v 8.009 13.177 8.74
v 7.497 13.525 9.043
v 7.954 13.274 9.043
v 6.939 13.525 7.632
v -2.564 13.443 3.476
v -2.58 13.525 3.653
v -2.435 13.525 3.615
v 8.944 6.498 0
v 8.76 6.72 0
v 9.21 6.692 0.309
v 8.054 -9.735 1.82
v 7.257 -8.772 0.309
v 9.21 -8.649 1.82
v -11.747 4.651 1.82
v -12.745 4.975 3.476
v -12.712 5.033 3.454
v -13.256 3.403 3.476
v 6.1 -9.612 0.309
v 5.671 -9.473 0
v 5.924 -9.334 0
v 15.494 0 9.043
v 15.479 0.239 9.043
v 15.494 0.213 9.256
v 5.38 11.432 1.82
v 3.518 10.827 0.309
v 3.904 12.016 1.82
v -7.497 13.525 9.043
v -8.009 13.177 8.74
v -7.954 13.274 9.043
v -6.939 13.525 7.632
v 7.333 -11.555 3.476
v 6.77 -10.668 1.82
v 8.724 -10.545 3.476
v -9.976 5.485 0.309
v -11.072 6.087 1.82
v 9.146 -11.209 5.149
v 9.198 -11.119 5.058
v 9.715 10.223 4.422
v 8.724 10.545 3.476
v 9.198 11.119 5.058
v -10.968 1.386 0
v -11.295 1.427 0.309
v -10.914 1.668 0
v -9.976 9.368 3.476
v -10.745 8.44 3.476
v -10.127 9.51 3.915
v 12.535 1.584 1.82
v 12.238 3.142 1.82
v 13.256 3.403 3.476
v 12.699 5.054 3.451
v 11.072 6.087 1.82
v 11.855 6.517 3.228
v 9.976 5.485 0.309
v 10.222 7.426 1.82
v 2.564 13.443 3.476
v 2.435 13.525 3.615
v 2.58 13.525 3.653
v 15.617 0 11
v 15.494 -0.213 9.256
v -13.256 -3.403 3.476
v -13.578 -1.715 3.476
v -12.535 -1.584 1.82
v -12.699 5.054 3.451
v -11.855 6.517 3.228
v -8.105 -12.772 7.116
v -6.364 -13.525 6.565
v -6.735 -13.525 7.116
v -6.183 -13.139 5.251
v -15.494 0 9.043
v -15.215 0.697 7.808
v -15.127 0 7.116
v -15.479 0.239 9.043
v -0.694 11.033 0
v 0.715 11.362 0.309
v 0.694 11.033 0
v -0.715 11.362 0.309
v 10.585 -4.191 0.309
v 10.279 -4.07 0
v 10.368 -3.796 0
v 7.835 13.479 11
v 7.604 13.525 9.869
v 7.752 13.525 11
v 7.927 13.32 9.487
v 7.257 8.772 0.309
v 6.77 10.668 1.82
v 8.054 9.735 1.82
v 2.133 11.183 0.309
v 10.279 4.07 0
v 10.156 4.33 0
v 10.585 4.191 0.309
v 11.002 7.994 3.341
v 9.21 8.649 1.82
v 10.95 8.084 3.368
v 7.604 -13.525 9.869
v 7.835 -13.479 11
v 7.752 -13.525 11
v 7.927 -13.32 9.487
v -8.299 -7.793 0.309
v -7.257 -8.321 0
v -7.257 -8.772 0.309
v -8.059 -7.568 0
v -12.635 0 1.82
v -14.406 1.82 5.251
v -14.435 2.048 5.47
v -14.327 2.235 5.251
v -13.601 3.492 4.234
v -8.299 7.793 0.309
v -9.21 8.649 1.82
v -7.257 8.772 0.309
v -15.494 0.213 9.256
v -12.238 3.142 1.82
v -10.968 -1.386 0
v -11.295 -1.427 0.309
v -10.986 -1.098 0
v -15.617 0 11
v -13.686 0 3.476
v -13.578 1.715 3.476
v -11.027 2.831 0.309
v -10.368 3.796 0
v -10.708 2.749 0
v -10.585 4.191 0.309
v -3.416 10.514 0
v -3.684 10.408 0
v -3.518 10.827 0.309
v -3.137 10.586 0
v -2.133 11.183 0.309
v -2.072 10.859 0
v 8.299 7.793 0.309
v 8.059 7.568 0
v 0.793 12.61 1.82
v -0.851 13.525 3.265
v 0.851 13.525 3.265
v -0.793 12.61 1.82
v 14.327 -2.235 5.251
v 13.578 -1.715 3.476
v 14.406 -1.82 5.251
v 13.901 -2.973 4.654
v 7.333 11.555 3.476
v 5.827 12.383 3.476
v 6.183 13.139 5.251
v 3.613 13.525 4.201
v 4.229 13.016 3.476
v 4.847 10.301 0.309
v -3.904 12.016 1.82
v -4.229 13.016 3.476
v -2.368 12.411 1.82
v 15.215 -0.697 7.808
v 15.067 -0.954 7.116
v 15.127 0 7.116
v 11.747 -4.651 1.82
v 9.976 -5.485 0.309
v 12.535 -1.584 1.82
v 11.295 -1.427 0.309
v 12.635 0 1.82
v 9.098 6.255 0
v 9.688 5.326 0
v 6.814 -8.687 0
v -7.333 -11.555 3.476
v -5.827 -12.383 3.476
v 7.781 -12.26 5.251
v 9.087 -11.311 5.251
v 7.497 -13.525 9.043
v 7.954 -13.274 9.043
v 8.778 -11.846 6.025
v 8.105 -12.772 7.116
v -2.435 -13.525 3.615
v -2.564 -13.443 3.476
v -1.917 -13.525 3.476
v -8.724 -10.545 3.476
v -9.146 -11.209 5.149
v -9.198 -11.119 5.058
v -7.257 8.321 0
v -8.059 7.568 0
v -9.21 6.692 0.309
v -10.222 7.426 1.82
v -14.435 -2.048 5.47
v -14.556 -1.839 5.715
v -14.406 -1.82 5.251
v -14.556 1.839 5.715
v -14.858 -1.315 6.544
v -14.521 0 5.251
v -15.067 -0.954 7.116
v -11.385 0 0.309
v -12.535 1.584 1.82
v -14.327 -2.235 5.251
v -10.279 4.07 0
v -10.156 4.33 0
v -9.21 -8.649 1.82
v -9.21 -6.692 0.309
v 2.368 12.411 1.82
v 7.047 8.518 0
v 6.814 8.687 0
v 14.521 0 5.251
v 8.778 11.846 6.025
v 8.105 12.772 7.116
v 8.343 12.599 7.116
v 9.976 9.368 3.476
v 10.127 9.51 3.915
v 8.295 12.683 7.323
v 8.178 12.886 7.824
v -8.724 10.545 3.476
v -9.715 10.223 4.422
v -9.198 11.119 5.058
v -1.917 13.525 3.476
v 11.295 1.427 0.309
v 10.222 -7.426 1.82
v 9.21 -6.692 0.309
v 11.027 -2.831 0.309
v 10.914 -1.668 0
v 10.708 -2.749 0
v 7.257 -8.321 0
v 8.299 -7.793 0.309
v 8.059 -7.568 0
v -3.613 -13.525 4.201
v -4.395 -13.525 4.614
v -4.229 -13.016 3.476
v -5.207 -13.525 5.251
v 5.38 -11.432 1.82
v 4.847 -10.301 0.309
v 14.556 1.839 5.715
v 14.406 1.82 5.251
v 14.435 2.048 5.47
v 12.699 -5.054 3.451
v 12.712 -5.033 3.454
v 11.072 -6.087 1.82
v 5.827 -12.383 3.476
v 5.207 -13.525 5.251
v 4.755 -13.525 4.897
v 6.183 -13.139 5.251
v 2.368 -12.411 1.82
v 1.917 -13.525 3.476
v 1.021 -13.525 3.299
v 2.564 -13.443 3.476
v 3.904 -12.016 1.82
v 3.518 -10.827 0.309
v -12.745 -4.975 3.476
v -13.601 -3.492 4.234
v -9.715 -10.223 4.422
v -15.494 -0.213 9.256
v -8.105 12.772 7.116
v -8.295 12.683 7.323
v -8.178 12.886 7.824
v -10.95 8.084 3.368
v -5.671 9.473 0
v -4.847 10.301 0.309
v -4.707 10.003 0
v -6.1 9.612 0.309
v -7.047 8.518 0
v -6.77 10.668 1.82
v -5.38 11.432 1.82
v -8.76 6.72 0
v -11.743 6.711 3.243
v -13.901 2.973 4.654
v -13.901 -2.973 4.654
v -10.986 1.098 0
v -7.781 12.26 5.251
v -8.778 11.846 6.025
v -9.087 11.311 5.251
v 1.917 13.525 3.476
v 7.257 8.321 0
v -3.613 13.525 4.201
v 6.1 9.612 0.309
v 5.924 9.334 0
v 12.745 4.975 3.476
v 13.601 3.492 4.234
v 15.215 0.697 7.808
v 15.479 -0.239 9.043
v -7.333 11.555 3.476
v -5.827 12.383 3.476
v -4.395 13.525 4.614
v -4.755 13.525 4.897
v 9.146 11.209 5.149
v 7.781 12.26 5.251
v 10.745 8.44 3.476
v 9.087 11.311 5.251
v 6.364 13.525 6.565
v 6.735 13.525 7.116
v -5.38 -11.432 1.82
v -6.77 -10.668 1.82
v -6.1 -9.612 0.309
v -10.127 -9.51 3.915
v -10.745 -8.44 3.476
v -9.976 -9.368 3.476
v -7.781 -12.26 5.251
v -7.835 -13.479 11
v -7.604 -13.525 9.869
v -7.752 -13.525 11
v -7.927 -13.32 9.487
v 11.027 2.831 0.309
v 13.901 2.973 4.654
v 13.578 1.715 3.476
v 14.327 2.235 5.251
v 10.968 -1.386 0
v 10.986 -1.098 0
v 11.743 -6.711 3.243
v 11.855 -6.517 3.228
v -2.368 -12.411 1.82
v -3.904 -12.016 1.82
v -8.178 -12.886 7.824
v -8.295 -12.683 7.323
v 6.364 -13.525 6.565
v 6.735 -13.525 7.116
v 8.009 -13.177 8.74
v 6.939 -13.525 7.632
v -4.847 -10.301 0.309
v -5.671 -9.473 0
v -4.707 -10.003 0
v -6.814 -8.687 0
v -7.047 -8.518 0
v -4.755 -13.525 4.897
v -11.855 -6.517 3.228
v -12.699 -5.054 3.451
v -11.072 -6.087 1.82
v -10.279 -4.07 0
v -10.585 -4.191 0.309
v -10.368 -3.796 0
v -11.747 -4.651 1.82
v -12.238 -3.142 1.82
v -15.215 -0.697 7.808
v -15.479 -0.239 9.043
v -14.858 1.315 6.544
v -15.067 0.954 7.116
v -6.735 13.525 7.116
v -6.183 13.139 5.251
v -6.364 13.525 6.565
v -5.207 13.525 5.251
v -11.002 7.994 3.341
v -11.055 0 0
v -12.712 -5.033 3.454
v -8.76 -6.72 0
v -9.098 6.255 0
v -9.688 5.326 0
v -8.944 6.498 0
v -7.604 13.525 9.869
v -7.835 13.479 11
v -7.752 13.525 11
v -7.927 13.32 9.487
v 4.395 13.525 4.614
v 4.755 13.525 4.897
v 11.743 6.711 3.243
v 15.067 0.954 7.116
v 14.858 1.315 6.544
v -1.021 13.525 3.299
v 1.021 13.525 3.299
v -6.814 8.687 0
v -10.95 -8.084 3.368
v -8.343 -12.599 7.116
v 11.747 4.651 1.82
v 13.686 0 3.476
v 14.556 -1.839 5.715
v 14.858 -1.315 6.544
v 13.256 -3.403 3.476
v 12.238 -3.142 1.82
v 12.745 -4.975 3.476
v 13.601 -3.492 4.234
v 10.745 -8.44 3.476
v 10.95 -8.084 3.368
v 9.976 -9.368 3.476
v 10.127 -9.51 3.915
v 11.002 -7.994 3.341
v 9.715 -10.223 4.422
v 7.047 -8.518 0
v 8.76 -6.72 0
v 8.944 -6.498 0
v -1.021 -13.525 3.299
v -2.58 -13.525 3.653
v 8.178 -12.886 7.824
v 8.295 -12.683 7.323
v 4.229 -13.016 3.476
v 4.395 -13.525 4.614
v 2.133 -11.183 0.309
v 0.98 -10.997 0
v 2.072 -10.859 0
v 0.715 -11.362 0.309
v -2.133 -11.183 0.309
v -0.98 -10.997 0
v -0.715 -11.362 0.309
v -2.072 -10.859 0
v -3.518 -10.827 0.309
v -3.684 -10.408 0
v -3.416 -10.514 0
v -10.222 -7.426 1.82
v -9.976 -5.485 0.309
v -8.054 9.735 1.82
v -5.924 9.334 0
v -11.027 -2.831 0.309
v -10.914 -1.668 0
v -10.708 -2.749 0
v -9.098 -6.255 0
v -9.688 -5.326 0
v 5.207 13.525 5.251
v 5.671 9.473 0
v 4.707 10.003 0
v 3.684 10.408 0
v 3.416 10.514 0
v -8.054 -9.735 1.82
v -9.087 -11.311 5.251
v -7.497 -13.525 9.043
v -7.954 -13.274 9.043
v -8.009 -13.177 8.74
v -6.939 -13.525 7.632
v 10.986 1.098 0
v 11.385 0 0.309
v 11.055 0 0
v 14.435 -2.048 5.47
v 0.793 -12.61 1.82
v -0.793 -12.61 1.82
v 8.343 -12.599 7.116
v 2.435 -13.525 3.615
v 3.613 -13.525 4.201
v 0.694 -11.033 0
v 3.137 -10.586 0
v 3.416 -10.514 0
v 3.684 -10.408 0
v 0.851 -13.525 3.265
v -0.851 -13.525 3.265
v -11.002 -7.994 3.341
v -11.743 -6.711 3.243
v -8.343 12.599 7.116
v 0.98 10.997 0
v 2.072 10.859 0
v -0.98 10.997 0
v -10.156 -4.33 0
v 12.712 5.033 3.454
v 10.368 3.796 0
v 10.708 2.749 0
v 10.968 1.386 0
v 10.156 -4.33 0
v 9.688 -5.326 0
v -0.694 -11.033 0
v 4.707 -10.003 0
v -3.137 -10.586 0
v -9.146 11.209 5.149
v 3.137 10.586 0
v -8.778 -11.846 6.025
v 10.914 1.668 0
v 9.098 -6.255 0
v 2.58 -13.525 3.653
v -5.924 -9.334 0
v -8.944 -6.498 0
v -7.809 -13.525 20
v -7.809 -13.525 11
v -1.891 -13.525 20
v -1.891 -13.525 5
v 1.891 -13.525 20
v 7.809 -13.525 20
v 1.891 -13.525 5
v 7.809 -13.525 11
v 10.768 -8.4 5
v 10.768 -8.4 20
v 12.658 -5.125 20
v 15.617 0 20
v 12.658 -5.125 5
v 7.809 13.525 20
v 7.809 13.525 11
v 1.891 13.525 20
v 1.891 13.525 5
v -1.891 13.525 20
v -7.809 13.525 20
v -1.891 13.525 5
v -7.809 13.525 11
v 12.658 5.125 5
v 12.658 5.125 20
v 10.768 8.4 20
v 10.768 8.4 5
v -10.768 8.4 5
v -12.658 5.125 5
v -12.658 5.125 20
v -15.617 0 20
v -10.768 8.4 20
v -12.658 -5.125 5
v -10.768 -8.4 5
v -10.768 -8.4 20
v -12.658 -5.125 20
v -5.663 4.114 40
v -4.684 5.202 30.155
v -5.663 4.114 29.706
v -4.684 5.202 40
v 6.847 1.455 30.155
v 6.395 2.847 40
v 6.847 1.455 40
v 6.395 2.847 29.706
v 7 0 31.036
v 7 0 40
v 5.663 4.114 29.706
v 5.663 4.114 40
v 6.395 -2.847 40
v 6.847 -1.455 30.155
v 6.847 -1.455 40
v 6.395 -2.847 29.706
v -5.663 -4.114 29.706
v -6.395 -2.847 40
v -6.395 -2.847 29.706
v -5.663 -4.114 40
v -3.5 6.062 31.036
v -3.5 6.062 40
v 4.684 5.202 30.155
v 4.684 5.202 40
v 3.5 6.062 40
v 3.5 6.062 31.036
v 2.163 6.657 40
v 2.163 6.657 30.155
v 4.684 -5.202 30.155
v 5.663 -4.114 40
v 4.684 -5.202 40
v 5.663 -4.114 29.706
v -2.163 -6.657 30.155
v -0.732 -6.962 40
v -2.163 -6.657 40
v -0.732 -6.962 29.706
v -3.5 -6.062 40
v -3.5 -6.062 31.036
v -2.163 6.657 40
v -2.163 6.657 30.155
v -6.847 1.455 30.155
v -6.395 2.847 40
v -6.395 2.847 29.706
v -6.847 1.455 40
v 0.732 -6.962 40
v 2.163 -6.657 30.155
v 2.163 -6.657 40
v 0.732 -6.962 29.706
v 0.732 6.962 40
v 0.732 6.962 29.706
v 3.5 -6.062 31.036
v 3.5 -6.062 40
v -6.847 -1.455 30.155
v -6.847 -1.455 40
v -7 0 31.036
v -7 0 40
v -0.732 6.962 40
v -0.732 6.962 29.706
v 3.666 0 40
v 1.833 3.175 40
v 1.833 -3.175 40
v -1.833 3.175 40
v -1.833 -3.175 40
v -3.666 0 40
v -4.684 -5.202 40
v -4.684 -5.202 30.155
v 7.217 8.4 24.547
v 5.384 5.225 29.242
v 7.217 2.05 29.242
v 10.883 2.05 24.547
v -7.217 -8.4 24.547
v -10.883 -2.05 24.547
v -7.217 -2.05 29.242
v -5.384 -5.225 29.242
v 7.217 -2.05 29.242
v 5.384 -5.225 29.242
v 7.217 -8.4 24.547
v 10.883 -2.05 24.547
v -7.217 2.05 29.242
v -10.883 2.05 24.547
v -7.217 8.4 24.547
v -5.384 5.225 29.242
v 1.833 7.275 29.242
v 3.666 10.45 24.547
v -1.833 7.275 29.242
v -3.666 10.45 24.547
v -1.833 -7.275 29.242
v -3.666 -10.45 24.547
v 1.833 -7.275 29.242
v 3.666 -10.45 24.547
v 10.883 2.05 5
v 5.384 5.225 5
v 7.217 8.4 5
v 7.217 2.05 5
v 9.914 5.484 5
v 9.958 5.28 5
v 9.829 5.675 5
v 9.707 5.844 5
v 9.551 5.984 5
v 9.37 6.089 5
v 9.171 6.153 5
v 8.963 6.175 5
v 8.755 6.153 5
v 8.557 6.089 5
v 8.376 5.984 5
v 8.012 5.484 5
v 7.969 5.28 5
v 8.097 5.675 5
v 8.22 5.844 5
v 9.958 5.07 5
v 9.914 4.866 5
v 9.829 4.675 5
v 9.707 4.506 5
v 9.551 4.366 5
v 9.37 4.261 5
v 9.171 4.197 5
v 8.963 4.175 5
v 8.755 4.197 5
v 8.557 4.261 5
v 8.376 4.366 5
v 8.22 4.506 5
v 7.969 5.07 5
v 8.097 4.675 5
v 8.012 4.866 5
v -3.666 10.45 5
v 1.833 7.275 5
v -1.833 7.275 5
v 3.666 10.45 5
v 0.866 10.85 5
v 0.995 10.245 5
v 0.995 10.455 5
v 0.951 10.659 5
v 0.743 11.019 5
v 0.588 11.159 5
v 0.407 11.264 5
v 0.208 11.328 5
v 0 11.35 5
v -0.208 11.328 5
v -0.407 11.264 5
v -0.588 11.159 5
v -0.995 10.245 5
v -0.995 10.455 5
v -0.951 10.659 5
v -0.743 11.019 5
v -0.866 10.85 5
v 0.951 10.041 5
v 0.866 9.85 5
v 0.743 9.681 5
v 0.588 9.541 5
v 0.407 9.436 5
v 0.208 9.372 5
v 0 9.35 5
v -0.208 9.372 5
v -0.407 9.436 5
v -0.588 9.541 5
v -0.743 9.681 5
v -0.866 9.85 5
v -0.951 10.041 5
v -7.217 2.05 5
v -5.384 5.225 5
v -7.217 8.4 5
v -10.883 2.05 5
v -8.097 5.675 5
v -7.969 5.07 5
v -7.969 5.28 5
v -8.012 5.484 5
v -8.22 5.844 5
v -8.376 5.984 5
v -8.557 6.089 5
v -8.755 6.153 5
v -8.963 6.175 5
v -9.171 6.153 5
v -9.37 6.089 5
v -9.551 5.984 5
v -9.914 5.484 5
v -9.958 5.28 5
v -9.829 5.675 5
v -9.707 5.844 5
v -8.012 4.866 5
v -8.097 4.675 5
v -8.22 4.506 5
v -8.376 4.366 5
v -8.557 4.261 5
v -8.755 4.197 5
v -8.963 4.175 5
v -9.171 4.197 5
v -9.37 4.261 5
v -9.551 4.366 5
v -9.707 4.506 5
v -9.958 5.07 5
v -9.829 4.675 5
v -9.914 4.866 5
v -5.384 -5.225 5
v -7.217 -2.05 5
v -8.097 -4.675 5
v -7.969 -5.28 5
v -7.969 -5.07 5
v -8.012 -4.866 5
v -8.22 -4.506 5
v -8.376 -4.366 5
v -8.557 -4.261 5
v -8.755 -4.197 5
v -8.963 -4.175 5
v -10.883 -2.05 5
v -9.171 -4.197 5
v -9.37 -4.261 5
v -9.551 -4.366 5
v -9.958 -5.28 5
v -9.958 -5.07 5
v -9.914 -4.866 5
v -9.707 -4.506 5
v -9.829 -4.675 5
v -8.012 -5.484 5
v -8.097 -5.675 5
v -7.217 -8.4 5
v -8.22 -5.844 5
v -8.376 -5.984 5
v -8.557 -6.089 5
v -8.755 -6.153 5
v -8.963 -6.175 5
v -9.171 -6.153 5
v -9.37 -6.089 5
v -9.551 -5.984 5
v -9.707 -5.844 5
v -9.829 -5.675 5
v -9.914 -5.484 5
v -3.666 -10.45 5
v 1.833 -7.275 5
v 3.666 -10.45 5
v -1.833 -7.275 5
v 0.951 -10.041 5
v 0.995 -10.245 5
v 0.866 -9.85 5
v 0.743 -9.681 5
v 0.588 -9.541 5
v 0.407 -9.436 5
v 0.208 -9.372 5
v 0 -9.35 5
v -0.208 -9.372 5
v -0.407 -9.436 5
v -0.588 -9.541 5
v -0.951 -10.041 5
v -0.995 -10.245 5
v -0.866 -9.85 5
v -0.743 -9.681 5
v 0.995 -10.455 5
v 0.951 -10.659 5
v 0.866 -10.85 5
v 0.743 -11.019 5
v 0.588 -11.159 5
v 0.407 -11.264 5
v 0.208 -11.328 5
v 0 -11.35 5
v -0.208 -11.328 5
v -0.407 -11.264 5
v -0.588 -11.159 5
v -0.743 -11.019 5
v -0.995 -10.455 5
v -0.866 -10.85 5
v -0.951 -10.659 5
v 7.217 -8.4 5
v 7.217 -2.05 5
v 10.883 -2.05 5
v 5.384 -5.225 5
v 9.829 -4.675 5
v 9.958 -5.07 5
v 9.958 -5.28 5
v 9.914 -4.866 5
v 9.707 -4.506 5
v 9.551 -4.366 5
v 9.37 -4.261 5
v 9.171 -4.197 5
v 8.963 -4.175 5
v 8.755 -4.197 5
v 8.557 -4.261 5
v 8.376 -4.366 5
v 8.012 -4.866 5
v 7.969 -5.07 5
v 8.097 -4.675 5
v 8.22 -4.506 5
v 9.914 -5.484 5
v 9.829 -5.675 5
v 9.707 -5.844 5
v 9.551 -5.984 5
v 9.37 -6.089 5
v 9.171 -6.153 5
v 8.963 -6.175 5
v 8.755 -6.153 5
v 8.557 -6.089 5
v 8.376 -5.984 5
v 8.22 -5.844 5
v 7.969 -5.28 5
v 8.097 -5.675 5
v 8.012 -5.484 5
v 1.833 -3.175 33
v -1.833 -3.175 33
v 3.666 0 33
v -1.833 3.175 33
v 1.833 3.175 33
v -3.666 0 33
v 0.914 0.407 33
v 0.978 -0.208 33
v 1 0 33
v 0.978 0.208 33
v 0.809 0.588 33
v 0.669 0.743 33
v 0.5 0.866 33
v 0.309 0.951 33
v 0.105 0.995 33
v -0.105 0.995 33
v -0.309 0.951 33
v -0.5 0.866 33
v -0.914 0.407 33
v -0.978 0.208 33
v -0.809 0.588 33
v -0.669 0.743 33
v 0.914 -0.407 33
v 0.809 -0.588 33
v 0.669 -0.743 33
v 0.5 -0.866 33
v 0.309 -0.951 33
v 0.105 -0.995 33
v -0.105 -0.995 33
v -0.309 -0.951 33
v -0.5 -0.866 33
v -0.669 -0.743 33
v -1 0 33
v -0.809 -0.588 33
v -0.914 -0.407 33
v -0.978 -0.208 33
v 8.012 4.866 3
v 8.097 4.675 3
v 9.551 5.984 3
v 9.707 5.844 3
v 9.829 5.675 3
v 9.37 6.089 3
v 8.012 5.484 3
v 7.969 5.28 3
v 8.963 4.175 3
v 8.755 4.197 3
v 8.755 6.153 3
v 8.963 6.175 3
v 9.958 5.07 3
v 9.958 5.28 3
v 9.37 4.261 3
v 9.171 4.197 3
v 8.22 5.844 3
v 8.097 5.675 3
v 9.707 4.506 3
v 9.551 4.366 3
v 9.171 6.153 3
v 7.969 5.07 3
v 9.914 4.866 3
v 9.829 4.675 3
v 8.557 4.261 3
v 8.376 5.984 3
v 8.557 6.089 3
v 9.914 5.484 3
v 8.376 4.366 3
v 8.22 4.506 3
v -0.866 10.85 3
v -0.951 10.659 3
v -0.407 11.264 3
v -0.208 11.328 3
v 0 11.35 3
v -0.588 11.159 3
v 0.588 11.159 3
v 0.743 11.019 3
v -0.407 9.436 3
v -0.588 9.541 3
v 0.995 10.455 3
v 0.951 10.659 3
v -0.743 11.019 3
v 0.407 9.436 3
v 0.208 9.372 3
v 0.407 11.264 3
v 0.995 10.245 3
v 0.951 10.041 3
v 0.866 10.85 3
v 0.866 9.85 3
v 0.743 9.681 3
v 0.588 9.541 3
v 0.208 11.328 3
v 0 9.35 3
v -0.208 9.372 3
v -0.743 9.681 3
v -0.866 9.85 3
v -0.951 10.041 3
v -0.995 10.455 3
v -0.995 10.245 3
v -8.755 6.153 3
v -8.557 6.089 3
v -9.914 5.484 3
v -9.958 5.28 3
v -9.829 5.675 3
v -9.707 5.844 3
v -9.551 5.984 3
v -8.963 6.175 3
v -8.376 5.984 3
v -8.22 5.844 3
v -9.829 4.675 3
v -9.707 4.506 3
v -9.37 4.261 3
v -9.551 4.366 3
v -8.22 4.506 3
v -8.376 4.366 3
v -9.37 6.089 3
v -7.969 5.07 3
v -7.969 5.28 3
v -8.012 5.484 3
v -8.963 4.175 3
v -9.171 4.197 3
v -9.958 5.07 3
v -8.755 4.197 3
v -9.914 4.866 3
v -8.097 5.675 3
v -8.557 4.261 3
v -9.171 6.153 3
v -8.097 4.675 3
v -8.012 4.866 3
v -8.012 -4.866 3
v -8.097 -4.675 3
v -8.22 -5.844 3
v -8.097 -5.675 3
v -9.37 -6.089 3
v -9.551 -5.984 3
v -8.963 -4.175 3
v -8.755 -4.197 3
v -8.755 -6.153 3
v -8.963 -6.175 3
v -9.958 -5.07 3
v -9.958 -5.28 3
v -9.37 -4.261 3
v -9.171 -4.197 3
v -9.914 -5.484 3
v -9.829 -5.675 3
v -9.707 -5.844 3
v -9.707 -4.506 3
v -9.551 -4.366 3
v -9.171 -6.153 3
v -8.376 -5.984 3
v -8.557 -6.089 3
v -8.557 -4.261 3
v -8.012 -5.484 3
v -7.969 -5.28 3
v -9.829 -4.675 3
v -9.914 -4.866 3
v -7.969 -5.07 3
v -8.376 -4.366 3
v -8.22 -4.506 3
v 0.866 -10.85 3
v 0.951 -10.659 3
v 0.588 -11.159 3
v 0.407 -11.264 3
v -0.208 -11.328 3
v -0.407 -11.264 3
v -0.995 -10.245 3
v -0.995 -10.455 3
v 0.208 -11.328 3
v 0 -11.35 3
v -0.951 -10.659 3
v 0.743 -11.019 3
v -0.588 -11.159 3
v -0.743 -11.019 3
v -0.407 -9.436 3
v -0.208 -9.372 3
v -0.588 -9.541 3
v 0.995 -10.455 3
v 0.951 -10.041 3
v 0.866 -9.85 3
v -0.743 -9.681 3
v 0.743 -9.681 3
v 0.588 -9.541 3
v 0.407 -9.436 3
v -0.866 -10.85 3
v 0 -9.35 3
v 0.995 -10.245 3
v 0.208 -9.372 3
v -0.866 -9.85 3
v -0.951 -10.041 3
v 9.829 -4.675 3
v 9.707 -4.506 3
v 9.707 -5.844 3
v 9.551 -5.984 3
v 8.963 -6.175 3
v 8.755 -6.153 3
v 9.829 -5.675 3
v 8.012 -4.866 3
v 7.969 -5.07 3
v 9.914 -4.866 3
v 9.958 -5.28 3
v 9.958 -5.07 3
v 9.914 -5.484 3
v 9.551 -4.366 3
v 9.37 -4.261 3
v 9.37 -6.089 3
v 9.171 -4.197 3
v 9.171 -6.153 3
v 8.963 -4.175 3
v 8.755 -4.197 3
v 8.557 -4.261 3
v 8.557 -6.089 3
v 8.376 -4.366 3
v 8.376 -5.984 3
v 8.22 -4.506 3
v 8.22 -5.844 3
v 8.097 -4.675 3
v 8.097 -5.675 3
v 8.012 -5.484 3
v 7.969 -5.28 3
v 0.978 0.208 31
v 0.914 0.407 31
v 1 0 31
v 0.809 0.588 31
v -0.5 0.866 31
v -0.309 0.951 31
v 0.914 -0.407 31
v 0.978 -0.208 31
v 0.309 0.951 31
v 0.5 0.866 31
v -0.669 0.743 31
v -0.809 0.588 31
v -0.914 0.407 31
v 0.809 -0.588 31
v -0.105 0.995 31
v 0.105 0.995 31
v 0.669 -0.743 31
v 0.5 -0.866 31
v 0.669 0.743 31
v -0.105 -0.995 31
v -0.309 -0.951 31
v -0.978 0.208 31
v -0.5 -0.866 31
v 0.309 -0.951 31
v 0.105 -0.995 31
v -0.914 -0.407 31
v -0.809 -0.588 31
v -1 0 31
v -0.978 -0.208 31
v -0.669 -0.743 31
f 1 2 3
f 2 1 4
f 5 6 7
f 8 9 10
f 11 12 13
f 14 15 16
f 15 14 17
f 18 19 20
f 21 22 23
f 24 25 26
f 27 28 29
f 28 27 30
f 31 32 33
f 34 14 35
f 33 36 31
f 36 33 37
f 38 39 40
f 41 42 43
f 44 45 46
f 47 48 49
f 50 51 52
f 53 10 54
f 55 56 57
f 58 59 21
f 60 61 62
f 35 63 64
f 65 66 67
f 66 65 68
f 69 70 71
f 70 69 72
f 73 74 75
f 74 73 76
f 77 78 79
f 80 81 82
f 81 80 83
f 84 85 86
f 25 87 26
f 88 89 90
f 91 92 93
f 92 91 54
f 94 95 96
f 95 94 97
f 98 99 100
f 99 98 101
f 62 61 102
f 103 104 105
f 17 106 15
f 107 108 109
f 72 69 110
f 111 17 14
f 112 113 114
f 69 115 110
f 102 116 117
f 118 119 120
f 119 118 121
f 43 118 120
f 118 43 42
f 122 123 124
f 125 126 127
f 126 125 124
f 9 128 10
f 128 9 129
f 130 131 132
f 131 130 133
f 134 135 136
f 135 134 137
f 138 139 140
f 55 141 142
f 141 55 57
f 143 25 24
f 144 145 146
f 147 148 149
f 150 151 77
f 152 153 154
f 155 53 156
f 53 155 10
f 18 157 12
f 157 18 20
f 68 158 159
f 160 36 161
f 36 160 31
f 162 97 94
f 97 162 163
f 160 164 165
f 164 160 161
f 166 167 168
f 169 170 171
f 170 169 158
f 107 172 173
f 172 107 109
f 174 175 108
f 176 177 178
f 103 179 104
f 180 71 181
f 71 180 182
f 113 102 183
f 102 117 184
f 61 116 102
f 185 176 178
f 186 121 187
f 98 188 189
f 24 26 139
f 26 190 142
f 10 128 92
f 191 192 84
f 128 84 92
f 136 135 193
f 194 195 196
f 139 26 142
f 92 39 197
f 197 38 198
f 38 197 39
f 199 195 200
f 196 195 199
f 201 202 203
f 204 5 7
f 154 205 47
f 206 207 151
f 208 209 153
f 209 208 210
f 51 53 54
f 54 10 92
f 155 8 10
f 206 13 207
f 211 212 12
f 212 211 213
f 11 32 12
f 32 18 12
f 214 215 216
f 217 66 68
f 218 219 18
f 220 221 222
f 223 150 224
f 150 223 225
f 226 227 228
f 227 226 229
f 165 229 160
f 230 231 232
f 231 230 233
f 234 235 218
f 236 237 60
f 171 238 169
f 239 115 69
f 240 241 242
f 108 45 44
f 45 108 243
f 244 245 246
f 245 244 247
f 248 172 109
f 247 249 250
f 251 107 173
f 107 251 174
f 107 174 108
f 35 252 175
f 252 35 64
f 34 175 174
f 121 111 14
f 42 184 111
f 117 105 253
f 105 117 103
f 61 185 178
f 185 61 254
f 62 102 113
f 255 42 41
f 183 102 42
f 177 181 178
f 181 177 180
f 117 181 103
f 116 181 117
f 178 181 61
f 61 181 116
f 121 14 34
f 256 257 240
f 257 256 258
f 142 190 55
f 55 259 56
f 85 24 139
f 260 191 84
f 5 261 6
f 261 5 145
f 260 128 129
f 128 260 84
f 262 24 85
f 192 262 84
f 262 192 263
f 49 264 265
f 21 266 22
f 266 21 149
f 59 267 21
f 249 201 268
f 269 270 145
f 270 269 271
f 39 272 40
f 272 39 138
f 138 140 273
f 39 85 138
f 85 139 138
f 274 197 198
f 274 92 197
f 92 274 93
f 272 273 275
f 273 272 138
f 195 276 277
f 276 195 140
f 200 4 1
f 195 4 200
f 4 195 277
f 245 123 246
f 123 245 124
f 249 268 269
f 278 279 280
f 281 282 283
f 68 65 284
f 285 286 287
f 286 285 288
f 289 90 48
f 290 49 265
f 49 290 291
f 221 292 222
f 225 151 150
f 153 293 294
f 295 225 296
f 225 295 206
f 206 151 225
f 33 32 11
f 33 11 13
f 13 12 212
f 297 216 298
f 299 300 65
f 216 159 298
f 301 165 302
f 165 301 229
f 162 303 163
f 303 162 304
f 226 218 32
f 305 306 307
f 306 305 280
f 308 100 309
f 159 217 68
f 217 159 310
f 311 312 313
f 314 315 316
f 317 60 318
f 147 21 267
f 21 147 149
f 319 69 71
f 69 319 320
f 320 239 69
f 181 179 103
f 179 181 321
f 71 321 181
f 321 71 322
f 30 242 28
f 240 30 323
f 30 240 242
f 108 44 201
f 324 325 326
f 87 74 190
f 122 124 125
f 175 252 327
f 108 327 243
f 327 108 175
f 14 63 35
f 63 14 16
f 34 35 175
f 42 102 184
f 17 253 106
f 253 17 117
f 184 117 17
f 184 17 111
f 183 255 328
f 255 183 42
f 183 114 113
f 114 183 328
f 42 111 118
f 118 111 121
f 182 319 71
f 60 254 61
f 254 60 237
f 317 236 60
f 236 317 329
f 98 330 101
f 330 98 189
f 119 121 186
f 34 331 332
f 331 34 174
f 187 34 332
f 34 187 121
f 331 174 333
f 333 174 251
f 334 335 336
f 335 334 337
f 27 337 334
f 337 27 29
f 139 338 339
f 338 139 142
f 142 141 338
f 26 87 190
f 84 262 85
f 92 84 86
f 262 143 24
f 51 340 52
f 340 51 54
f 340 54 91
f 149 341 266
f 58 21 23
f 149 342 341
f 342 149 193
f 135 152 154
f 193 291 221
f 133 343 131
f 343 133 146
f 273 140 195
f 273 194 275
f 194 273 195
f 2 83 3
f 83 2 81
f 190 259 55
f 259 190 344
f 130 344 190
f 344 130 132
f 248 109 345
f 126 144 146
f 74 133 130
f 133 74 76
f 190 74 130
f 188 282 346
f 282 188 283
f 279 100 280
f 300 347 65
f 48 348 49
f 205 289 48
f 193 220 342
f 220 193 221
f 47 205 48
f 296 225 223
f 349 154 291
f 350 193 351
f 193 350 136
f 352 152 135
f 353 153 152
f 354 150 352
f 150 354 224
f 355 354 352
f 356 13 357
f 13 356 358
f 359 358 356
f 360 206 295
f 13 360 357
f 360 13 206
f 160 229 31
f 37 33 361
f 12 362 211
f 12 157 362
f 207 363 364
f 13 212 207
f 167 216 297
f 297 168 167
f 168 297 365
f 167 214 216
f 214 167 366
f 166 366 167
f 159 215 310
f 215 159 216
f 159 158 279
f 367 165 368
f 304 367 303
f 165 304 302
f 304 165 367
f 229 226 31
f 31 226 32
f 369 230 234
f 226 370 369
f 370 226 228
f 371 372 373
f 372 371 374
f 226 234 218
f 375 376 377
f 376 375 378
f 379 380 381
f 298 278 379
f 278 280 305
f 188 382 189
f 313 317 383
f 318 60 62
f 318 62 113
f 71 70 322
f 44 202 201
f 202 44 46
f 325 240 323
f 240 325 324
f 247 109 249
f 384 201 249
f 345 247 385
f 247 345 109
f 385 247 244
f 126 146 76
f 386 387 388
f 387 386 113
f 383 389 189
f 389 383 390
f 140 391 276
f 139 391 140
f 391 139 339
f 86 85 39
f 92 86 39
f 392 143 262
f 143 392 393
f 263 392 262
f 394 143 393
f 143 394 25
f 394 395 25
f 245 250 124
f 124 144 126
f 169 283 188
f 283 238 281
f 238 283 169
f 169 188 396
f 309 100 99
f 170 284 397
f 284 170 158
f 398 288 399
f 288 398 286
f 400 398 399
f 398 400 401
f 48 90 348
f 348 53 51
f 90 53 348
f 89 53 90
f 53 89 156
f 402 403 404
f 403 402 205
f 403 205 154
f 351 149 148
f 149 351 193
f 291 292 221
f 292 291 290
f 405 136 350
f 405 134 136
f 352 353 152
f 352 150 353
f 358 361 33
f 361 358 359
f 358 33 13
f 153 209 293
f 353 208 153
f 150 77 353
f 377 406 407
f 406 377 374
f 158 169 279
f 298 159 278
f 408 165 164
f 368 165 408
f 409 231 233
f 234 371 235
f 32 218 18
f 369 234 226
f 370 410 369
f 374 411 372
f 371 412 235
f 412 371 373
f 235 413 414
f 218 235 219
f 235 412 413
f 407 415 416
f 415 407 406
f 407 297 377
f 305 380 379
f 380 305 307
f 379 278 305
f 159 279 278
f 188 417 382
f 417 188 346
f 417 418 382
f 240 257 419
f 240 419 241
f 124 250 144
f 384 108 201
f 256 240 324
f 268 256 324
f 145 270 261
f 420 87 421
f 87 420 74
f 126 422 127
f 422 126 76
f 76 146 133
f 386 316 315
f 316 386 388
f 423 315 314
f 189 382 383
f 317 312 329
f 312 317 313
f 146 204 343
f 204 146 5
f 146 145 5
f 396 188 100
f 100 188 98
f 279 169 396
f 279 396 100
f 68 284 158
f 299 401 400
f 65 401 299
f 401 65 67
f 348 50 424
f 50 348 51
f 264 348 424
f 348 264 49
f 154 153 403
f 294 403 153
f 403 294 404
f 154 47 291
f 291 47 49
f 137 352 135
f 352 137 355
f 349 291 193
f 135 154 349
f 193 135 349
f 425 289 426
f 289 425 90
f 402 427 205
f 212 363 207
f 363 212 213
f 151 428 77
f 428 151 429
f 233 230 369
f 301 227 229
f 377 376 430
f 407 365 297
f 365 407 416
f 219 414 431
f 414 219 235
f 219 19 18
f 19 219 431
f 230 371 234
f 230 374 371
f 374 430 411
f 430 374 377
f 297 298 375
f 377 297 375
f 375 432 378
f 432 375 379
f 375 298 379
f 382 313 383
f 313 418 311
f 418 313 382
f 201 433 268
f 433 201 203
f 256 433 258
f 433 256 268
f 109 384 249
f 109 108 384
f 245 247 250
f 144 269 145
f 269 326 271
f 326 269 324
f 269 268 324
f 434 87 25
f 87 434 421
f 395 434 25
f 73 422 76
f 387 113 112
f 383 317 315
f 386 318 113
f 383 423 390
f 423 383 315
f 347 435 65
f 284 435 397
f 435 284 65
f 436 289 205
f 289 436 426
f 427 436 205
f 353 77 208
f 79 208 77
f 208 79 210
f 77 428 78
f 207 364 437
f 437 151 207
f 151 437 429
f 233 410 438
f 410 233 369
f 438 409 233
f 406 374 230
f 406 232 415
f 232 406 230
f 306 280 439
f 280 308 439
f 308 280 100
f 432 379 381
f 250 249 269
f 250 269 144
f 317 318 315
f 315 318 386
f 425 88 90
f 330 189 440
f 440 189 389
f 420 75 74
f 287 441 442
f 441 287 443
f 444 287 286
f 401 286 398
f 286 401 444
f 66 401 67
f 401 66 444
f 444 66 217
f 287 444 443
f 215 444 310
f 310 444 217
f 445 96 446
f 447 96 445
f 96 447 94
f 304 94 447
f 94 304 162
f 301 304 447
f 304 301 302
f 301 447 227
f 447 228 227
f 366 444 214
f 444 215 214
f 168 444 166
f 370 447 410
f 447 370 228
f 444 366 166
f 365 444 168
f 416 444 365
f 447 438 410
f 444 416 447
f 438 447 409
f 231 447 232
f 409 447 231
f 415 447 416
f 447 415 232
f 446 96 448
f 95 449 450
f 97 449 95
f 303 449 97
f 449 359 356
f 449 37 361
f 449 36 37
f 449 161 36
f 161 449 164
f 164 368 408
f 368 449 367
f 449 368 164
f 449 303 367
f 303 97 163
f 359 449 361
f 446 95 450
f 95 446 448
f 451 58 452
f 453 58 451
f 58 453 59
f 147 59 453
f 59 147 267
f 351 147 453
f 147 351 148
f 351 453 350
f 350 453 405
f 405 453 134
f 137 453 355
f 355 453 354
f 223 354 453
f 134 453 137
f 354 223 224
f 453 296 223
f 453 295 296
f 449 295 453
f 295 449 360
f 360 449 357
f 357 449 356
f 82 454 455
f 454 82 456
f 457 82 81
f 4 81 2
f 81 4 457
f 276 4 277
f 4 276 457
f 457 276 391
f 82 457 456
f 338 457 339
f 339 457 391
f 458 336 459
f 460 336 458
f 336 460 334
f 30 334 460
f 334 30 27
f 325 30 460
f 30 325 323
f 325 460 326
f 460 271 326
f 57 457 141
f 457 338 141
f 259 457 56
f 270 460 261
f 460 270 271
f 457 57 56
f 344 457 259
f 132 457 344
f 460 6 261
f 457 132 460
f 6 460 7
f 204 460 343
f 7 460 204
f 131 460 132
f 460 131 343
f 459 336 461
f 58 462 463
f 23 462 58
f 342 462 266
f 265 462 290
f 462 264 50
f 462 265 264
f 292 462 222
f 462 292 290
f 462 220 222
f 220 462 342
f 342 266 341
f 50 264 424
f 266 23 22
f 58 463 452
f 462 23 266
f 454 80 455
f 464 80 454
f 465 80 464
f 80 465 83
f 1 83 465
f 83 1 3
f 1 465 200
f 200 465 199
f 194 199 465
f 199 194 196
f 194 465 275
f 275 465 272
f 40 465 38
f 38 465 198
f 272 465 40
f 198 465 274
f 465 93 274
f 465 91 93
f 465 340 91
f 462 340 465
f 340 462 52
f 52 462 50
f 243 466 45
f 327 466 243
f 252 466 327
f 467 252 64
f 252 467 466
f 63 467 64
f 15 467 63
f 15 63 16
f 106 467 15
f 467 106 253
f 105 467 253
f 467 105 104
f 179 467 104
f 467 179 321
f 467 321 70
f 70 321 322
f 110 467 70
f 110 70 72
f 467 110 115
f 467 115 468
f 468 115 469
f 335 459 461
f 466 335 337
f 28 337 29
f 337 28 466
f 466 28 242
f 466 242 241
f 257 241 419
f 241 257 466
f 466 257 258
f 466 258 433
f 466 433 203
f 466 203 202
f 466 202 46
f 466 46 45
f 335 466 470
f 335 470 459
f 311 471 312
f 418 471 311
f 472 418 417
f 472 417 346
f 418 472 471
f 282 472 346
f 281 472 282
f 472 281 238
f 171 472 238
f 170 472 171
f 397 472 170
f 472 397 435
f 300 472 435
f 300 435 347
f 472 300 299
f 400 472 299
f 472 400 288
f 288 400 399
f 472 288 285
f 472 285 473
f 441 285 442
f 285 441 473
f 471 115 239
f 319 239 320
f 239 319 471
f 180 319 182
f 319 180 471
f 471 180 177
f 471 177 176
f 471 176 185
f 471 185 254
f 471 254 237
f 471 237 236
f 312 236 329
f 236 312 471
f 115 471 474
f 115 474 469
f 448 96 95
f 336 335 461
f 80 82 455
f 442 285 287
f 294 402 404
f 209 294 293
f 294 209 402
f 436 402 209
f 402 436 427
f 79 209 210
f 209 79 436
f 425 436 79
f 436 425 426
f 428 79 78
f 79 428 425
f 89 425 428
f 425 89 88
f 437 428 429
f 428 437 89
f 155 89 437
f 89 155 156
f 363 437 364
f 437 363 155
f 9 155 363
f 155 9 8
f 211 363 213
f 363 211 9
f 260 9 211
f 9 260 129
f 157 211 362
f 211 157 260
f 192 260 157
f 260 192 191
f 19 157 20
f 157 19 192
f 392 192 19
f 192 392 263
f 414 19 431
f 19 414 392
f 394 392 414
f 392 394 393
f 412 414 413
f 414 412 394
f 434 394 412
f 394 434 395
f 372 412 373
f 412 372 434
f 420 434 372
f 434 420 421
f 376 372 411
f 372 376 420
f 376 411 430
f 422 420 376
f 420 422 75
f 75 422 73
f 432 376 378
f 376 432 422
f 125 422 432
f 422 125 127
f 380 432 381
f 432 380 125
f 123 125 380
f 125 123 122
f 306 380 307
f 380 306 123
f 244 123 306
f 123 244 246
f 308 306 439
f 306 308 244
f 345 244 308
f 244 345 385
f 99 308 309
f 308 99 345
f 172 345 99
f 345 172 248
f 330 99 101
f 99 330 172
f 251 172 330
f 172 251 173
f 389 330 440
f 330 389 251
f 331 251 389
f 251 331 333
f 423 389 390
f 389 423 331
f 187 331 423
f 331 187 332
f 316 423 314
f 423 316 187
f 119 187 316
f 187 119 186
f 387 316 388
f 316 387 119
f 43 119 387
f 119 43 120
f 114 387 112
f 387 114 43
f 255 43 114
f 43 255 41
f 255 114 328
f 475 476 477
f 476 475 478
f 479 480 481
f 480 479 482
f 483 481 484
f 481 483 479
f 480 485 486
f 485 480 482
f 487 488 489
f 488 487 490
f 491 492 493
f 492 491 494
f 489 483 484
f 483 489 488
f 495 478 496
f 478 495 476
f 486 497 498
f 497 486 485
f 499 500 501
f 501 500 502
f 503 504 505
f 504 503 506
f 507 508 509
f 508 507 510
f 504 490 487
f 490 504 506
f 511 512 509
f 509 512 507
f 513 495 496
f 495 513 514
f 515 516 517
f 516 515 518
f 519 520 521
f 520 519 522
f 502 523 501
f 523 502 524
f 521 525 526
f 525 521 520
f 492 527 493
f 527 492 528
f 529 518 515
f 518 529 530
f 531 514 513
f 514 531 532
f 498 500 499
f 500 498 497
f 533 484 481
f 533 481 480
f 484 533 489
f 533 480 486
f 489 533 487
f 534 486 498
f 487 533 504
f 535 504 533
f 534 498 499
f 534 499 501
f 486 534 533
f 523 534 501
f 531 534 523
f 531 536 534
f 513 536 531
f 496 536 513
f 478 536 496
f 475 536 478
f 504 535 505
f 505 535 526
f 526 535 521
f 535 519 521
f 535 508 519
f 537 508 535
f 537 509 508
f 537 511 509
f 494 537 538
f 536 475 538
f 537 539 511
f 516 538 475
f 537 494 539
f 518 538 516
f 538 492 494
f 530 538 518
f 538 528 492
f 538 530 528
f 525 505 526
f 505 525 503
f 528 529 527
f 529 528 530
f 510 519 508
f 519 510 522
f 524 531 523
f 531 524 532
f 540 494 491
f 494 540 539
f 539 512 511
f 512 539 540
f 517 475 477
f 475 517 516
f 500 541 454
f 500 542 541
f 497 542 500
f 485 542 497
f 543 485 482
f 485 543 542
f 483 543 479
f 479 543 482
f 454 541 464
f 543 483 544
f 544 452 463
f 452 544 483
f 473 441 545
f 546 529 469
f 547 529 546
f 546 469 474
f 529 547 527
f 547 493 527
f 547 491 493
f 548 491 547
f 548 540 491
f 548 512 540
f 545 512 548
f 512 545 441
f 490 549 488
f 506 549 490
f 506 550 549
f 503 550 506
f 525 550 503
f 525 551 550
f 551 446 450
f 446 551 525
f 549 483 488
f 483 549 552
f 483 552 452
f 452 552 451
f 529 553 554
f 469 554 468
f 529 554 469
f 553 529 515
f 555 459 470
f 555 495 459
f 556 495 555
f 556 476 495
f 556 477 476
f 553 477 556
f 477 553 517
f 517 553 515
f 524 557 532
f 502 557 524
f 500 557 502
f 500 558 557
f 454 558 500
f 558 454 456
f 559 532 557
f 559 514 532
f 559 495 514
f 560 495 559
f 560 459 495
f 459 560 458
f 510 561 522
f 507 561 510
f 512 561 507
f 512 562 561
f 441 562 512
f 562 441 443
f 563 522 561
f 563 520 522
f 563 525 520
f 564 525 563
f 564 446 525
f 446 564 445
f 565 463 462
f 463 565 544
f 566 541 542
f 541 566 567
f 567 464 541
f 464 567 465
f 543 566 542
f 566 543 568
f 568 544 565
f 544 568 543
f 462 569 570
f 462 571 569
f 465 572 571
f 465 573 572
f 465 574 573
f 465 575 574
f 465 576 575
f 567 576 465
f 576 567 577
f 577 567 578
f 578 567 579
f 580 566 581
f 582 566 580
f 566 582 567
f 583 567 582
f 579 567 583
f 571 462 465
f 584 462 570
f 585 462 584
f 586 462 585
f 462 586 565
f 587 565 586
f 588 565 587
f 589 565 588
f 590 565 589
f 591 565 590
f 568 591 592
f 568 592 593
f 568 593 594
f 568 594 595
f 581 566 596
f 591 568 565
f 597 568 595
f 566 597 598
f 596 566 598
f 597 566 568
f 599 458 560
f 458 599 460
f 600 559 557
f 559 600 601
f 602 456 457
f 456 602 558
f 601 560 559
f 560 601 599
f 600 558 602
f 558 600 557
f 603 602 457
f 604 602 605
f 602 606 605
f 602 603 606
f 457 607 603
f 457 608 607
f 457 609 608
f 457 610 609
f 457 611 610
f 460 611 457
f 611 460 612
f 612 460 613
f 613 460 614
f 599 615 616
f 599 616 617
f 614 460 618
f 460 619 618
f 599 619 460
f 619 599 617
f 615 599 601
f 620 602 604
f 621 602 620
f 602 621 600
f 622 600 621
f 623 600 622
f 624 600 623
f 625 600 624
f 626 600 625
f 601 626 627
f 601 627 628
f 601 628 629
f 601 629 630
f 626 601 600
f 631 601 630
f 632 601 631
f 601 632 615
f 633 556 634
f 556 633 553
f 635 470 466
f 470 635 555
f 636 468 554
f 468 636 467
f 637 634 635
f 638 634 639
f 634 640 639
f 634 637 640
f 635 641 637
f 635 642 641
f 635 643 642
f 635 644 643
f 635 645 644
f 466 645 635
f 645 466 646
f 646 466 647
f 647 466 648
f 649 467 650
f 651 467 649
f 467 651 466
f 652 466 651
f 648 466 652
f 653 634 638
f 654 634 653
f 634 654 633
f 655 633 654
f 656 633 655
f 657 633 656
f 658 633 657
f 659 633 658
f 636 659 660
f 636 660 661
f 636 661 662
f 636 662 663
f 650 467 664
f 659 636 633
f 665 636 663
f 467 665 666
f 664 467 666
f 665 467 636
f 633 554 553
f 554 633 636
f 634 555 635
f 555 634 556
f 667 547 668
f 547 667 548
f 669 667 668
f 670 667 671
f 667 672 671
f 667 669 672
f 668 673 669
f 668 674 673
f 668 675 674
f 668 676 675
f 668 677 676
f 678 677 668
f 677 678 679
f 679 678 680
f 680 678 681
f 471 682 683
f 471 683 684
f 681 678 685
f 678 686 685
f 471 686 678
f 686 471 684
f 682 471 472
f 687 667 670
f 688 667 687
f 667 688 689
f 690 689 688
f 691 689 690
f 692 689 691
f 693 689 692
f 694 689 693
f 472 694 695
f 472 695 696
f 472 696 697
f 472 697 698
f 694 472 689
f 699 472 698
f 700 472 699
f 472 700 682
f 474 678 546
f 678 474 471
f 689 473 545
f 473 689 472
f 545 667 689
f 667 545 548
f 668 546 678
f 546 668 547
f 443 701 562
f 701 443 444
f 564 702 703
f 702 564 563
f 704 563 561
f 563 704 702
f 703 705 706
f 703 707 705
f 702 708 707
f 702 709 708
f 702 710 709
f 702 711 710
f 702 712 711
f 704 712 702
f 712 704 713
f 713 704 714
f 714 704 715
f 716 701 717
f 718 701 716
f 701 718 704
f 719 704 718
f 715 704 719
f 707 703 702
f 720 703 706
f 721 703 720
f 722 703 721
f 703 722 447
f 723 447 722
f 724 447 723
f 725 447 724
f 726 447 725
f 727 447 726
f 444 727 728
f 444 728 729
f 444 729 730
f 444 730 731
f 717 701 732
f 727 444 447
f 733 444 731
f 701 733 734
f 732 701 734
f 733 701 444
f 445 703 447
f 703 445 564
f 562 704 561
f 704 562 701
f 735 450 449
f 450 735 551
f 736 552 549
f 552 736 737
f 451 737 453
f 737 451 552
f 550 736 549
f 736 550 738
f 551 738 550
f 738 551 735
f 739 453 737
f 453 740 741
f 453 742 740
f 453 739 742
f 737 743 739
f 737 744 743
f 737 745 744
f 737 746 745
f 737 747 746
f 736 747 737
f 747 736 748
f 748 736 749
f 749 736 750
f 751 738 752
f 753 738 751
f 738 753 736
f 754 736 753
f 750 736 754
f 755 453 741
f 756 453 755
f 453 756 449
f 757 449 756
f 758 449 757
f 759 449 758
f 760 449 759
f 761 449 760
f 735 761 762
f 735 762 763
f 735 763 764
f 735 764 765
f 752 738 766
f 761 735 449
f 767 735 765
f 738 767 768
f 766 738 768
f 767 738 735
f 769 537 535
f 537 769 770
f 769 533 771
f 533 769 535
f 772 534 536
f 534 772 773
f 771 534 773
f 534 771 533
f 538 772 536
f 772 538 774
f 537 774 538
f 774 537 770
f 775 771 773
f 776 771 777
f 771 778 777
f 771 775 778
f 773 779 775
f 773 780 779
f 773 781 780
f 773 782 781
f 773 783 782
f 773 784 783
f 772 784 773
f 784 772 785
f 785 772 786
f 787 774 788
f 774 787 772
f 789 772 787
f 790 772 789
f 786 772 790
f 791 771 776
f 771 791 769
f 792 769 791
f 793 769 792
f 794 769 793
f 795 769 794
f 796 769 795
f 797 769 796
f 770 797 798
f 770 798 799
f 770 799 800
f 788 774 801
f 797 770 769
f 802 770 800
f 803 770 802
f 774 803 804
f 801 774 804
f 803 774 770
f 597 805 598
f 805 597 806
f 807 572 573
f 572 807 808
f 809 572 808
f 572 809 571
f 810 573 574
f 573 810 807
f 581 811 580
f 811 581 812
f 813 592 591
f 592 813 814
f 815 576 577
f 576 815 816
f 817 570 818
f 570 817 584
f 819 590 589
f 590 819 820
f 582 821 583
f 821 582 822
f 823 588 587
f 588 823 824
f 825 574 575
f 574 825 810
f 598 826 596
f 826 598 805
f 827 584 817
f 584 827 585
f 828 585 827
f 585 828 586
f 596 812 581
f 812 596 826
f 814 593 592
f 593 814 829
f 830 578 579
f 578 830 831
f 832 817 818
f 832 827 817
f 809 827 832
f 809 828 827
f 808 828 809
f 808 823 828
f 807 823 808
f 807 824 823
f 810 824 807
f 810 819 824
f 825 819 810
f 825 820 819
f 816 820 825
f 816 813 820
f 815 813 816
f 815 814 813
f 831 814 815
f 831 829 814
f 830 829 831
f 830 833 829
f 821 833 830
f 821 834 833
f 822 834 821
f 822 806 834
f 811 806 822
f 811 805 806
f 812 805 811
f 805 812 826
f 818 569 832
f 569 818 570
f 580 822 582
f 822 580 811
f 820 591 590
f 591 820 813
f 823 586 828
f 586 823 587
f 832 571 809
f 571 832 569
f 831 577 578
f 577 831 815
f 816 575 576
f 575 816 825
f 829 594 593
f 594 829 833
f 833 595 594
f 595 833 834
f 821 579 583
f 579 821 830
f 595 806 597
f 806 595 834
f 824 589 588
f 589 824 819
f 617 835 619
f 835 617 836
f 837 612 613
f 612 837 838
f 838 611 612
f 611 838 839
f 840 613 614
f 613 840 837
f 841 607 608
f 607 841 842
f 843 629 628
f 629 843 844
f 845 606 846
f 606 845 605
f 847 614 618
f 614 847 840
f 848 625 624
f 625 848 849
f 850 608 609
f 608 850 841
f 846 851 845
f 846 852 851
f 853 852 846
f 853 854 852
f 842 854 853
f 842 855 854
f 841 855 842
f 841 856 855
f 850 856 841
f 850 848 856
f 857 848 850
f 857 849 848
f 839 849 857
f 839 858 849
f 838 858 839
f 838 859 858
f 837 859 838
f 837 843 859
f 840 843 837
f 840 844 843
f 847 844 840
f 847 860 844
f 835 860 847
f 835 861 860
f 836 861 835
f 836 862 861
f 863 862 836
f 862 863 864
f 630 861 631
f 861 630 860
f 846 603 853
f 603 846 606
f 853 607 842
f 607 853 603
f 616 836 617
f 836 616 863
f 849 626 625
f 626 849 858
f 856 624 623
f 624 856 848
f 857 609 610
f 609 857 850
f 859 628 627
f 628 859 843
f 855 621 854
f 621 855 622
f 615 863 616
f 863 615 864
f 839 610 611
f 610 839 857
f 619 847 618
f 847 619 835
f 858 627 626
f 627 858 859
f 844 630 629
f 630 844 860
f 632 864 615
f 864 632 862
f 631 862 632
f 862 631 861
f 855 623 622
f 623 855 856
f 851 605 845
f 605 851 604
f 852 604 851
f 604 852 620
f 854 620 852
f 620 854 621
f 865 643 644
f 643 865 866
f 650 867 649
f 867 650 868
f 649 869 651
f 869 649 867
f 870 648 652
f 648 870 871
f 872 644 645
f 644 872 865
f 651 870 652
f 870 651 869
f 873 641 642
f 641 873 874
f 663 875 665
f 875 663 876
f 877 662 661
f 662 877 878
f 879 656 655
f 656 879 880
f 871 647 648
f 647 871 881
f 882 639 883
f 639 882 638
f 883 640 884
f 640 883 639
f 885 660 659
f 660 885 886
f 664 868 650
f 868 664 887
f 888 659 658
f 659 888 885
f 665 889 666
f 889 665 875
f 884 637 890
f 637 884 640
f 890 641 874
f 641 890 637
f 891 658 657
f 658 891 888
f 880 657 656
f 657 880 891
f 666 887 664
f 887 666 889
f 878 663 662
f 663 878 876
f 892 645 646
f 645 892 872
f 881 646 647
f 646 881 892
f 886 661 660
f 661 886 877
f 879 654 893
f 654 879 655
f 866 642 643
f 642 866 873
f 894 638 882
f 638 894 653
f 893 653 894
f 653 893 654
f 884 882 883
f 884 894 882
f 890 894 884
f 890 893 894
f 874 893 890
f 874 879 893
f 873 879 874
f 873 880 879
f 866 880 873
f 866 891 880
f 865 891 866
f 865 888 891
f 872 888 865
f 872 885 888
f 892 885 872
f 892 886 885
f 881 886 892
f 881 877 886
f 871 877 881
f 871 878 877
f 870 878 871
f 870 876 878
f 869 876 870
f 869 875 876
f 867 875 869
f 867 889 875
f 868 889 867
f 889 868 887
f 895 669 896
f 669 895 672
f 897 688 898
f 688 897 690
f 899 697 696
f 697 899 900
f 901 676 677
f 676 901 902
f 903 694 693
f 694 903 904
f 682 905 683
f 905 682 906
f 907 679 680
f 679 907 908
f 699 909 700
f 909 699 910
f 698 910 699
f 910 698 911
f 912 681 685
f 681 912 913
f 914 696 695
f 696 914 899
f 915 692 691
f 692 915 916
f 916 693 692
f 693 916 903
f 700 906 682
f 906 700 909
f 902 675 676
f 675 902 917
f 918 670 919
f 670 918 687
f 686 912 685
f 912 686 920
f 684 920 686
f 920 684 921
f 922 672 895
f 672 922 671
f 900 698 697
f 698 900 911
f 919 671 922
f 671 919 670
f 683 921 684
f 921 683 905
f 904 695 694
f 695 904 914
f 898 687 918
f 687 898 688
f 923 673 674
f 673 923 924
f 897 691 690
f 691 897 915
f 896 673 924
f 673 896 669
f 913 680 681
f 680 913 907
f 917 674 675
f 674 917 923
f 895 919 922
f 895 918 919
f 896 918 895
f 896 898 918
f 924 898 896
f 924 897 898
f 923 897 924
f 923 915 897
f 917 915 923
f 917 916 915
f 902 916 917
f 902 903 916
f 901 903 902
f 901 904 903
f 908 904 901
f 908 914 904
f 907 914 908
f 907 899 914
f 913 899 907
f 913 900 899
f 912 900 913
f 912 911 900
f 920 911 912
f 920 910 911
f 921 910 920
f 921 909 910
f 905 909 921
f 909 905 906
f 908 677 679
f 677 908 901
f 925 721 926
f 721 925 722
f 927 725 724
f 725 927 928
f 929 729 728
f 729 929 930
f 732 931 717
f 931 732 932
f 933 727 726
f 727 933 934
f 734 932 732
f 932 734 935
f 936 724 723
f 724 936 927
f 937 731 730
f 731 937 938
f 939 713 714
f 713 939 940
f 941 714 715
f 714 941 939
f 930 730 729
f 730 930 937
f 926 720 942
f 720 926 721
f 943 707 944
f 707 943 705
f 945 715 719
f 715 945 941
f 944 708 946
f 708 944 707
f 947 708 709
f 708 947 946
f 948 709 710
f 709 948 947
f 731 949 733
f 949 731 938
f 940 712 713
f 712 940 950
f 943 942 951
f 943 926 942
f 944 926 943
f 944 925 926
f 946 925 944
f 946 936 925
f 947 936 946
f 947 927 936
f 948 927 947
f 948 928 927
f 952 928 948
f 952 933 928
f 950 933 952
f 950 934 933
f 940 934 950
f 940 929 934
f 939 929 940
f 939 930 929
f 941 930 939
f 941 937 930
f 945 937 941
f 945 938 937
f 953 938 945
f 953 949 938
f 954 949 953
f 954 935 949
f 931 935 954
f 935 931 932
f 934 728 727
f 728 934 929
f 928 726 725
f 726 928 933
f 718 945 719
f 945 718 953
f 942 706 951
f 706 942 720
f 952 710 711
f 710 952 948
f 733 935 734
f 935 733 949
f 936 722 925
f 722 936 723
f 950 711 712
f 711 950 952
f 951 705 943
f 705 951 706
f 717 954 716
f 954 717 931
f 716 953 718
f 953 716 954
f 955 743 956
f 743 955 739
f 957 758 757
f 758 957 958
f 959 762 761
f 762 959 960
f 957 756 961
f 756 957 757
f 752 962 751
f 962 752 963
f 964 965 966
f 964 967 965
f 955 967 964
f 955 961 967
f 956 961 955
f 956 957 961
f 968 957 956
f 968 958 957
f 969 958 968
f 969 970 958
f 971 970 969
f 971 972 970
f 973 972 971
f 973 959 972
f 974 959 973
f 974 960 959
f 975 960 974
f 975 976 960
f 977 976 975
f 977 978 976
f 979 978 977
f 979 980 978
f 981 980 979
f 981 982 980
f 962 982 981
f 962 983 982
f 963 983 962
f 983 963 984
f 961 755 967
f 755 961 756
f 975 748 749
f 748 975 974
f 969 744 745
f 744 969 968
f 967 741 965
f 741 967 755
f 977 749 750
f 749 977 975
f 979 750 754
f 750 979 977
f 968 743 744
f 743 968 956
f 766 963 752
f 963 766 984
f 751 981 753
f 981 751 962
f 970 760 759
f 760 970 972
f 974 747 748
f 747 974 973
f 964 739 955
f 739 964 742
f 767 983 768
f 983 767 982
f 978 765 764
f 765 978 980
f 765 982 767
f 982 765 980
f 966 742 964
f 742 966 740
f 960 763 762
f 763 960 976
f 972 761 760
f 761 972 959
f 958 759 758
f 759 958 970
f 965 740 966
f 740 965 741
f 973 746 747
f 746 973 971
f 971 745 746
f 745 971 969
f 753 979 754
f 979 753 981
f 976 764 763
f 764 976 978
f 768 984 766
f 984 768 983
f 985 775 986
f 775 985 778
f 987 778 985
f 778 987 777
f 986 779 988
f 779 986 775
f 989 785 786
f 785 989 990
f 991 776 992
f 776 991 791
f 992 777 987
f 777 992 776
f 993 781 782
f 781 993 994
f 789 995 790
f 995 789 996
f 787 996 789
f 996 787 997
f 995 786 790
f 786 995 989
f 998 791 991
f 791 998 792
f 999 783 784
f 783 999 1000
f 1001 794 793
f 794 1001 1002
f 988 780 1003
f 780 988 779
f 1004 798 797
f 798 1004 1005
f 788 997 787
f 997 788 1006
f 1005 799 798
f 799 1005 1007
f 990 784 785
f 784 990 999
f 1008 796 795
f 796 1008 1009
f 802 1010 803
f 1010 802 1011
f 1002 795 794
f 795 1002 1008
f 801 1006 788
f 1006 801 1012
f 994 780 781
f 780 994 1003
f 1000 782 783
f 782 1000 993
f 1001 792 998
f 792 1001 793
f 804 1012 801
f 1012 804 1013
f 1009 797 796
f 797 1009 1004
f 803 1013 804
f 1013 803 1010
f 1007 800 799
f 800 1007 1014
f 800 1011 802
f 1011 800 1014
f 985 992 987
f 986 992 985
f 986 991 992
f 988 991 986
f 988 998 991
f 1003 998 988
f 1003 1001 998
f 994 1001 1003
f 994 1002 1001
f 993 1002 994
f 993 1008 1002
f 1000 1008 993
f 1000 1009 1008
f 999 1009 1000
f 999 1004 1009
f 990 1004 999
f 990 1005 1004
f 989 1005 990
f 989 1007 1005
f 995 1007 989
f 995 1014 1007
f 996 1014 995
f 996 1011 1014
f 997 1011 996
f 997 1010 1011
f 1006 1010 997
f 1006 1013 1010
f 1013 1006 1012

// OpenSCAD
// [FL_INDEX: keywords="openscad, 3d_parametric, Customizable_bit_holder_and_screw_driver, csg_solid" | COT="Parametric OpenSCAD design from 3DCodeverse"]
// Title: Customizable bit holder and screw driver

//Creates a customisable scredriver bit holder

//Number of bits
bits = 6; //[3:15]
//increase or decrease to fit tolerance for bits
bitf2f = 6.35; 

//radius of the magnet you are going to use
magnetr = 1;

//height of the magnet you are going to use
magneth = 2;

//walls between bits on the side.  If you set it too small it will take the minimal value
walls = 4;

//Radius of the center column
center_rad = 7;

//height of the total thing
height = 40;

//height of handle
height2 = 20;

//more or less bulb at the bottom
heightb = 11;

//-------------------
//maths

bitd = bitf2f / cos(30);  
bitr = bitd/2;

centerr = max(bitr, center_rad);


theta = 360 / bits;

x1 = tan(theta/2) * bitf2f / 2;
x2 = bitr + (walls/2/cos(theta/2));
x = x1 + x2;
outerr = max(
	centerr + bitf2f + (tan(theta/4) * x),
	x / sin(theta/2));

ringr = max(centerr, outerr - (bitf2f/2) - (tan(theta/4) * x));



//-----------------


module bits() {
	translate([0,0,height - 7])cylinder(r = bitr, h = 50, $fn = 6);	
	for (i = [theta/2: theta:360]) {
		rotate([0,0,i])translate([ringr + 0.1, 0 , height2 - 15])rotate([0,0,30])cylinder(r = bitr, h = 50, $fn = 6);	
	}
}

module magnets() {
	translate([0,0,height - 7 - magneth])cylinder(r = magnetr, h = magneth + 1, $fn = 30);	
	for (i = [theta/2: theta:360]) {
		rotate([0,0,i])translate([ringr, 0 , height2 - 15- magneth])cylinder(r = magnetr, h = magneth + 1, $fn = 30);	
	}
}

module body(){
	cylinder(r = centerr, h = height, $fn = 30);	
	
	translate([0, 0, height2])cylinder(r1 = outerr, r2 = 0, h = 20, $fn = bits);

	
	intersection() {
		//rounded bottom
		translate([0, 0, heightb]) {
			intersection() {
	 			sphere(outerr, $fn = 50);
	 			cylinder(r = outerr, h =outerr *2 , center=true, $fn = bits);
			}
			cylinder(r = outerr, h = height, center=false, $fn = bits);
		}	

		//cut top and bottom
		translate ([-250, -250,0])cube([500, 500, height2]);
	}
	

}

difference() {
	body();	
	bits();
	magnets();
}
